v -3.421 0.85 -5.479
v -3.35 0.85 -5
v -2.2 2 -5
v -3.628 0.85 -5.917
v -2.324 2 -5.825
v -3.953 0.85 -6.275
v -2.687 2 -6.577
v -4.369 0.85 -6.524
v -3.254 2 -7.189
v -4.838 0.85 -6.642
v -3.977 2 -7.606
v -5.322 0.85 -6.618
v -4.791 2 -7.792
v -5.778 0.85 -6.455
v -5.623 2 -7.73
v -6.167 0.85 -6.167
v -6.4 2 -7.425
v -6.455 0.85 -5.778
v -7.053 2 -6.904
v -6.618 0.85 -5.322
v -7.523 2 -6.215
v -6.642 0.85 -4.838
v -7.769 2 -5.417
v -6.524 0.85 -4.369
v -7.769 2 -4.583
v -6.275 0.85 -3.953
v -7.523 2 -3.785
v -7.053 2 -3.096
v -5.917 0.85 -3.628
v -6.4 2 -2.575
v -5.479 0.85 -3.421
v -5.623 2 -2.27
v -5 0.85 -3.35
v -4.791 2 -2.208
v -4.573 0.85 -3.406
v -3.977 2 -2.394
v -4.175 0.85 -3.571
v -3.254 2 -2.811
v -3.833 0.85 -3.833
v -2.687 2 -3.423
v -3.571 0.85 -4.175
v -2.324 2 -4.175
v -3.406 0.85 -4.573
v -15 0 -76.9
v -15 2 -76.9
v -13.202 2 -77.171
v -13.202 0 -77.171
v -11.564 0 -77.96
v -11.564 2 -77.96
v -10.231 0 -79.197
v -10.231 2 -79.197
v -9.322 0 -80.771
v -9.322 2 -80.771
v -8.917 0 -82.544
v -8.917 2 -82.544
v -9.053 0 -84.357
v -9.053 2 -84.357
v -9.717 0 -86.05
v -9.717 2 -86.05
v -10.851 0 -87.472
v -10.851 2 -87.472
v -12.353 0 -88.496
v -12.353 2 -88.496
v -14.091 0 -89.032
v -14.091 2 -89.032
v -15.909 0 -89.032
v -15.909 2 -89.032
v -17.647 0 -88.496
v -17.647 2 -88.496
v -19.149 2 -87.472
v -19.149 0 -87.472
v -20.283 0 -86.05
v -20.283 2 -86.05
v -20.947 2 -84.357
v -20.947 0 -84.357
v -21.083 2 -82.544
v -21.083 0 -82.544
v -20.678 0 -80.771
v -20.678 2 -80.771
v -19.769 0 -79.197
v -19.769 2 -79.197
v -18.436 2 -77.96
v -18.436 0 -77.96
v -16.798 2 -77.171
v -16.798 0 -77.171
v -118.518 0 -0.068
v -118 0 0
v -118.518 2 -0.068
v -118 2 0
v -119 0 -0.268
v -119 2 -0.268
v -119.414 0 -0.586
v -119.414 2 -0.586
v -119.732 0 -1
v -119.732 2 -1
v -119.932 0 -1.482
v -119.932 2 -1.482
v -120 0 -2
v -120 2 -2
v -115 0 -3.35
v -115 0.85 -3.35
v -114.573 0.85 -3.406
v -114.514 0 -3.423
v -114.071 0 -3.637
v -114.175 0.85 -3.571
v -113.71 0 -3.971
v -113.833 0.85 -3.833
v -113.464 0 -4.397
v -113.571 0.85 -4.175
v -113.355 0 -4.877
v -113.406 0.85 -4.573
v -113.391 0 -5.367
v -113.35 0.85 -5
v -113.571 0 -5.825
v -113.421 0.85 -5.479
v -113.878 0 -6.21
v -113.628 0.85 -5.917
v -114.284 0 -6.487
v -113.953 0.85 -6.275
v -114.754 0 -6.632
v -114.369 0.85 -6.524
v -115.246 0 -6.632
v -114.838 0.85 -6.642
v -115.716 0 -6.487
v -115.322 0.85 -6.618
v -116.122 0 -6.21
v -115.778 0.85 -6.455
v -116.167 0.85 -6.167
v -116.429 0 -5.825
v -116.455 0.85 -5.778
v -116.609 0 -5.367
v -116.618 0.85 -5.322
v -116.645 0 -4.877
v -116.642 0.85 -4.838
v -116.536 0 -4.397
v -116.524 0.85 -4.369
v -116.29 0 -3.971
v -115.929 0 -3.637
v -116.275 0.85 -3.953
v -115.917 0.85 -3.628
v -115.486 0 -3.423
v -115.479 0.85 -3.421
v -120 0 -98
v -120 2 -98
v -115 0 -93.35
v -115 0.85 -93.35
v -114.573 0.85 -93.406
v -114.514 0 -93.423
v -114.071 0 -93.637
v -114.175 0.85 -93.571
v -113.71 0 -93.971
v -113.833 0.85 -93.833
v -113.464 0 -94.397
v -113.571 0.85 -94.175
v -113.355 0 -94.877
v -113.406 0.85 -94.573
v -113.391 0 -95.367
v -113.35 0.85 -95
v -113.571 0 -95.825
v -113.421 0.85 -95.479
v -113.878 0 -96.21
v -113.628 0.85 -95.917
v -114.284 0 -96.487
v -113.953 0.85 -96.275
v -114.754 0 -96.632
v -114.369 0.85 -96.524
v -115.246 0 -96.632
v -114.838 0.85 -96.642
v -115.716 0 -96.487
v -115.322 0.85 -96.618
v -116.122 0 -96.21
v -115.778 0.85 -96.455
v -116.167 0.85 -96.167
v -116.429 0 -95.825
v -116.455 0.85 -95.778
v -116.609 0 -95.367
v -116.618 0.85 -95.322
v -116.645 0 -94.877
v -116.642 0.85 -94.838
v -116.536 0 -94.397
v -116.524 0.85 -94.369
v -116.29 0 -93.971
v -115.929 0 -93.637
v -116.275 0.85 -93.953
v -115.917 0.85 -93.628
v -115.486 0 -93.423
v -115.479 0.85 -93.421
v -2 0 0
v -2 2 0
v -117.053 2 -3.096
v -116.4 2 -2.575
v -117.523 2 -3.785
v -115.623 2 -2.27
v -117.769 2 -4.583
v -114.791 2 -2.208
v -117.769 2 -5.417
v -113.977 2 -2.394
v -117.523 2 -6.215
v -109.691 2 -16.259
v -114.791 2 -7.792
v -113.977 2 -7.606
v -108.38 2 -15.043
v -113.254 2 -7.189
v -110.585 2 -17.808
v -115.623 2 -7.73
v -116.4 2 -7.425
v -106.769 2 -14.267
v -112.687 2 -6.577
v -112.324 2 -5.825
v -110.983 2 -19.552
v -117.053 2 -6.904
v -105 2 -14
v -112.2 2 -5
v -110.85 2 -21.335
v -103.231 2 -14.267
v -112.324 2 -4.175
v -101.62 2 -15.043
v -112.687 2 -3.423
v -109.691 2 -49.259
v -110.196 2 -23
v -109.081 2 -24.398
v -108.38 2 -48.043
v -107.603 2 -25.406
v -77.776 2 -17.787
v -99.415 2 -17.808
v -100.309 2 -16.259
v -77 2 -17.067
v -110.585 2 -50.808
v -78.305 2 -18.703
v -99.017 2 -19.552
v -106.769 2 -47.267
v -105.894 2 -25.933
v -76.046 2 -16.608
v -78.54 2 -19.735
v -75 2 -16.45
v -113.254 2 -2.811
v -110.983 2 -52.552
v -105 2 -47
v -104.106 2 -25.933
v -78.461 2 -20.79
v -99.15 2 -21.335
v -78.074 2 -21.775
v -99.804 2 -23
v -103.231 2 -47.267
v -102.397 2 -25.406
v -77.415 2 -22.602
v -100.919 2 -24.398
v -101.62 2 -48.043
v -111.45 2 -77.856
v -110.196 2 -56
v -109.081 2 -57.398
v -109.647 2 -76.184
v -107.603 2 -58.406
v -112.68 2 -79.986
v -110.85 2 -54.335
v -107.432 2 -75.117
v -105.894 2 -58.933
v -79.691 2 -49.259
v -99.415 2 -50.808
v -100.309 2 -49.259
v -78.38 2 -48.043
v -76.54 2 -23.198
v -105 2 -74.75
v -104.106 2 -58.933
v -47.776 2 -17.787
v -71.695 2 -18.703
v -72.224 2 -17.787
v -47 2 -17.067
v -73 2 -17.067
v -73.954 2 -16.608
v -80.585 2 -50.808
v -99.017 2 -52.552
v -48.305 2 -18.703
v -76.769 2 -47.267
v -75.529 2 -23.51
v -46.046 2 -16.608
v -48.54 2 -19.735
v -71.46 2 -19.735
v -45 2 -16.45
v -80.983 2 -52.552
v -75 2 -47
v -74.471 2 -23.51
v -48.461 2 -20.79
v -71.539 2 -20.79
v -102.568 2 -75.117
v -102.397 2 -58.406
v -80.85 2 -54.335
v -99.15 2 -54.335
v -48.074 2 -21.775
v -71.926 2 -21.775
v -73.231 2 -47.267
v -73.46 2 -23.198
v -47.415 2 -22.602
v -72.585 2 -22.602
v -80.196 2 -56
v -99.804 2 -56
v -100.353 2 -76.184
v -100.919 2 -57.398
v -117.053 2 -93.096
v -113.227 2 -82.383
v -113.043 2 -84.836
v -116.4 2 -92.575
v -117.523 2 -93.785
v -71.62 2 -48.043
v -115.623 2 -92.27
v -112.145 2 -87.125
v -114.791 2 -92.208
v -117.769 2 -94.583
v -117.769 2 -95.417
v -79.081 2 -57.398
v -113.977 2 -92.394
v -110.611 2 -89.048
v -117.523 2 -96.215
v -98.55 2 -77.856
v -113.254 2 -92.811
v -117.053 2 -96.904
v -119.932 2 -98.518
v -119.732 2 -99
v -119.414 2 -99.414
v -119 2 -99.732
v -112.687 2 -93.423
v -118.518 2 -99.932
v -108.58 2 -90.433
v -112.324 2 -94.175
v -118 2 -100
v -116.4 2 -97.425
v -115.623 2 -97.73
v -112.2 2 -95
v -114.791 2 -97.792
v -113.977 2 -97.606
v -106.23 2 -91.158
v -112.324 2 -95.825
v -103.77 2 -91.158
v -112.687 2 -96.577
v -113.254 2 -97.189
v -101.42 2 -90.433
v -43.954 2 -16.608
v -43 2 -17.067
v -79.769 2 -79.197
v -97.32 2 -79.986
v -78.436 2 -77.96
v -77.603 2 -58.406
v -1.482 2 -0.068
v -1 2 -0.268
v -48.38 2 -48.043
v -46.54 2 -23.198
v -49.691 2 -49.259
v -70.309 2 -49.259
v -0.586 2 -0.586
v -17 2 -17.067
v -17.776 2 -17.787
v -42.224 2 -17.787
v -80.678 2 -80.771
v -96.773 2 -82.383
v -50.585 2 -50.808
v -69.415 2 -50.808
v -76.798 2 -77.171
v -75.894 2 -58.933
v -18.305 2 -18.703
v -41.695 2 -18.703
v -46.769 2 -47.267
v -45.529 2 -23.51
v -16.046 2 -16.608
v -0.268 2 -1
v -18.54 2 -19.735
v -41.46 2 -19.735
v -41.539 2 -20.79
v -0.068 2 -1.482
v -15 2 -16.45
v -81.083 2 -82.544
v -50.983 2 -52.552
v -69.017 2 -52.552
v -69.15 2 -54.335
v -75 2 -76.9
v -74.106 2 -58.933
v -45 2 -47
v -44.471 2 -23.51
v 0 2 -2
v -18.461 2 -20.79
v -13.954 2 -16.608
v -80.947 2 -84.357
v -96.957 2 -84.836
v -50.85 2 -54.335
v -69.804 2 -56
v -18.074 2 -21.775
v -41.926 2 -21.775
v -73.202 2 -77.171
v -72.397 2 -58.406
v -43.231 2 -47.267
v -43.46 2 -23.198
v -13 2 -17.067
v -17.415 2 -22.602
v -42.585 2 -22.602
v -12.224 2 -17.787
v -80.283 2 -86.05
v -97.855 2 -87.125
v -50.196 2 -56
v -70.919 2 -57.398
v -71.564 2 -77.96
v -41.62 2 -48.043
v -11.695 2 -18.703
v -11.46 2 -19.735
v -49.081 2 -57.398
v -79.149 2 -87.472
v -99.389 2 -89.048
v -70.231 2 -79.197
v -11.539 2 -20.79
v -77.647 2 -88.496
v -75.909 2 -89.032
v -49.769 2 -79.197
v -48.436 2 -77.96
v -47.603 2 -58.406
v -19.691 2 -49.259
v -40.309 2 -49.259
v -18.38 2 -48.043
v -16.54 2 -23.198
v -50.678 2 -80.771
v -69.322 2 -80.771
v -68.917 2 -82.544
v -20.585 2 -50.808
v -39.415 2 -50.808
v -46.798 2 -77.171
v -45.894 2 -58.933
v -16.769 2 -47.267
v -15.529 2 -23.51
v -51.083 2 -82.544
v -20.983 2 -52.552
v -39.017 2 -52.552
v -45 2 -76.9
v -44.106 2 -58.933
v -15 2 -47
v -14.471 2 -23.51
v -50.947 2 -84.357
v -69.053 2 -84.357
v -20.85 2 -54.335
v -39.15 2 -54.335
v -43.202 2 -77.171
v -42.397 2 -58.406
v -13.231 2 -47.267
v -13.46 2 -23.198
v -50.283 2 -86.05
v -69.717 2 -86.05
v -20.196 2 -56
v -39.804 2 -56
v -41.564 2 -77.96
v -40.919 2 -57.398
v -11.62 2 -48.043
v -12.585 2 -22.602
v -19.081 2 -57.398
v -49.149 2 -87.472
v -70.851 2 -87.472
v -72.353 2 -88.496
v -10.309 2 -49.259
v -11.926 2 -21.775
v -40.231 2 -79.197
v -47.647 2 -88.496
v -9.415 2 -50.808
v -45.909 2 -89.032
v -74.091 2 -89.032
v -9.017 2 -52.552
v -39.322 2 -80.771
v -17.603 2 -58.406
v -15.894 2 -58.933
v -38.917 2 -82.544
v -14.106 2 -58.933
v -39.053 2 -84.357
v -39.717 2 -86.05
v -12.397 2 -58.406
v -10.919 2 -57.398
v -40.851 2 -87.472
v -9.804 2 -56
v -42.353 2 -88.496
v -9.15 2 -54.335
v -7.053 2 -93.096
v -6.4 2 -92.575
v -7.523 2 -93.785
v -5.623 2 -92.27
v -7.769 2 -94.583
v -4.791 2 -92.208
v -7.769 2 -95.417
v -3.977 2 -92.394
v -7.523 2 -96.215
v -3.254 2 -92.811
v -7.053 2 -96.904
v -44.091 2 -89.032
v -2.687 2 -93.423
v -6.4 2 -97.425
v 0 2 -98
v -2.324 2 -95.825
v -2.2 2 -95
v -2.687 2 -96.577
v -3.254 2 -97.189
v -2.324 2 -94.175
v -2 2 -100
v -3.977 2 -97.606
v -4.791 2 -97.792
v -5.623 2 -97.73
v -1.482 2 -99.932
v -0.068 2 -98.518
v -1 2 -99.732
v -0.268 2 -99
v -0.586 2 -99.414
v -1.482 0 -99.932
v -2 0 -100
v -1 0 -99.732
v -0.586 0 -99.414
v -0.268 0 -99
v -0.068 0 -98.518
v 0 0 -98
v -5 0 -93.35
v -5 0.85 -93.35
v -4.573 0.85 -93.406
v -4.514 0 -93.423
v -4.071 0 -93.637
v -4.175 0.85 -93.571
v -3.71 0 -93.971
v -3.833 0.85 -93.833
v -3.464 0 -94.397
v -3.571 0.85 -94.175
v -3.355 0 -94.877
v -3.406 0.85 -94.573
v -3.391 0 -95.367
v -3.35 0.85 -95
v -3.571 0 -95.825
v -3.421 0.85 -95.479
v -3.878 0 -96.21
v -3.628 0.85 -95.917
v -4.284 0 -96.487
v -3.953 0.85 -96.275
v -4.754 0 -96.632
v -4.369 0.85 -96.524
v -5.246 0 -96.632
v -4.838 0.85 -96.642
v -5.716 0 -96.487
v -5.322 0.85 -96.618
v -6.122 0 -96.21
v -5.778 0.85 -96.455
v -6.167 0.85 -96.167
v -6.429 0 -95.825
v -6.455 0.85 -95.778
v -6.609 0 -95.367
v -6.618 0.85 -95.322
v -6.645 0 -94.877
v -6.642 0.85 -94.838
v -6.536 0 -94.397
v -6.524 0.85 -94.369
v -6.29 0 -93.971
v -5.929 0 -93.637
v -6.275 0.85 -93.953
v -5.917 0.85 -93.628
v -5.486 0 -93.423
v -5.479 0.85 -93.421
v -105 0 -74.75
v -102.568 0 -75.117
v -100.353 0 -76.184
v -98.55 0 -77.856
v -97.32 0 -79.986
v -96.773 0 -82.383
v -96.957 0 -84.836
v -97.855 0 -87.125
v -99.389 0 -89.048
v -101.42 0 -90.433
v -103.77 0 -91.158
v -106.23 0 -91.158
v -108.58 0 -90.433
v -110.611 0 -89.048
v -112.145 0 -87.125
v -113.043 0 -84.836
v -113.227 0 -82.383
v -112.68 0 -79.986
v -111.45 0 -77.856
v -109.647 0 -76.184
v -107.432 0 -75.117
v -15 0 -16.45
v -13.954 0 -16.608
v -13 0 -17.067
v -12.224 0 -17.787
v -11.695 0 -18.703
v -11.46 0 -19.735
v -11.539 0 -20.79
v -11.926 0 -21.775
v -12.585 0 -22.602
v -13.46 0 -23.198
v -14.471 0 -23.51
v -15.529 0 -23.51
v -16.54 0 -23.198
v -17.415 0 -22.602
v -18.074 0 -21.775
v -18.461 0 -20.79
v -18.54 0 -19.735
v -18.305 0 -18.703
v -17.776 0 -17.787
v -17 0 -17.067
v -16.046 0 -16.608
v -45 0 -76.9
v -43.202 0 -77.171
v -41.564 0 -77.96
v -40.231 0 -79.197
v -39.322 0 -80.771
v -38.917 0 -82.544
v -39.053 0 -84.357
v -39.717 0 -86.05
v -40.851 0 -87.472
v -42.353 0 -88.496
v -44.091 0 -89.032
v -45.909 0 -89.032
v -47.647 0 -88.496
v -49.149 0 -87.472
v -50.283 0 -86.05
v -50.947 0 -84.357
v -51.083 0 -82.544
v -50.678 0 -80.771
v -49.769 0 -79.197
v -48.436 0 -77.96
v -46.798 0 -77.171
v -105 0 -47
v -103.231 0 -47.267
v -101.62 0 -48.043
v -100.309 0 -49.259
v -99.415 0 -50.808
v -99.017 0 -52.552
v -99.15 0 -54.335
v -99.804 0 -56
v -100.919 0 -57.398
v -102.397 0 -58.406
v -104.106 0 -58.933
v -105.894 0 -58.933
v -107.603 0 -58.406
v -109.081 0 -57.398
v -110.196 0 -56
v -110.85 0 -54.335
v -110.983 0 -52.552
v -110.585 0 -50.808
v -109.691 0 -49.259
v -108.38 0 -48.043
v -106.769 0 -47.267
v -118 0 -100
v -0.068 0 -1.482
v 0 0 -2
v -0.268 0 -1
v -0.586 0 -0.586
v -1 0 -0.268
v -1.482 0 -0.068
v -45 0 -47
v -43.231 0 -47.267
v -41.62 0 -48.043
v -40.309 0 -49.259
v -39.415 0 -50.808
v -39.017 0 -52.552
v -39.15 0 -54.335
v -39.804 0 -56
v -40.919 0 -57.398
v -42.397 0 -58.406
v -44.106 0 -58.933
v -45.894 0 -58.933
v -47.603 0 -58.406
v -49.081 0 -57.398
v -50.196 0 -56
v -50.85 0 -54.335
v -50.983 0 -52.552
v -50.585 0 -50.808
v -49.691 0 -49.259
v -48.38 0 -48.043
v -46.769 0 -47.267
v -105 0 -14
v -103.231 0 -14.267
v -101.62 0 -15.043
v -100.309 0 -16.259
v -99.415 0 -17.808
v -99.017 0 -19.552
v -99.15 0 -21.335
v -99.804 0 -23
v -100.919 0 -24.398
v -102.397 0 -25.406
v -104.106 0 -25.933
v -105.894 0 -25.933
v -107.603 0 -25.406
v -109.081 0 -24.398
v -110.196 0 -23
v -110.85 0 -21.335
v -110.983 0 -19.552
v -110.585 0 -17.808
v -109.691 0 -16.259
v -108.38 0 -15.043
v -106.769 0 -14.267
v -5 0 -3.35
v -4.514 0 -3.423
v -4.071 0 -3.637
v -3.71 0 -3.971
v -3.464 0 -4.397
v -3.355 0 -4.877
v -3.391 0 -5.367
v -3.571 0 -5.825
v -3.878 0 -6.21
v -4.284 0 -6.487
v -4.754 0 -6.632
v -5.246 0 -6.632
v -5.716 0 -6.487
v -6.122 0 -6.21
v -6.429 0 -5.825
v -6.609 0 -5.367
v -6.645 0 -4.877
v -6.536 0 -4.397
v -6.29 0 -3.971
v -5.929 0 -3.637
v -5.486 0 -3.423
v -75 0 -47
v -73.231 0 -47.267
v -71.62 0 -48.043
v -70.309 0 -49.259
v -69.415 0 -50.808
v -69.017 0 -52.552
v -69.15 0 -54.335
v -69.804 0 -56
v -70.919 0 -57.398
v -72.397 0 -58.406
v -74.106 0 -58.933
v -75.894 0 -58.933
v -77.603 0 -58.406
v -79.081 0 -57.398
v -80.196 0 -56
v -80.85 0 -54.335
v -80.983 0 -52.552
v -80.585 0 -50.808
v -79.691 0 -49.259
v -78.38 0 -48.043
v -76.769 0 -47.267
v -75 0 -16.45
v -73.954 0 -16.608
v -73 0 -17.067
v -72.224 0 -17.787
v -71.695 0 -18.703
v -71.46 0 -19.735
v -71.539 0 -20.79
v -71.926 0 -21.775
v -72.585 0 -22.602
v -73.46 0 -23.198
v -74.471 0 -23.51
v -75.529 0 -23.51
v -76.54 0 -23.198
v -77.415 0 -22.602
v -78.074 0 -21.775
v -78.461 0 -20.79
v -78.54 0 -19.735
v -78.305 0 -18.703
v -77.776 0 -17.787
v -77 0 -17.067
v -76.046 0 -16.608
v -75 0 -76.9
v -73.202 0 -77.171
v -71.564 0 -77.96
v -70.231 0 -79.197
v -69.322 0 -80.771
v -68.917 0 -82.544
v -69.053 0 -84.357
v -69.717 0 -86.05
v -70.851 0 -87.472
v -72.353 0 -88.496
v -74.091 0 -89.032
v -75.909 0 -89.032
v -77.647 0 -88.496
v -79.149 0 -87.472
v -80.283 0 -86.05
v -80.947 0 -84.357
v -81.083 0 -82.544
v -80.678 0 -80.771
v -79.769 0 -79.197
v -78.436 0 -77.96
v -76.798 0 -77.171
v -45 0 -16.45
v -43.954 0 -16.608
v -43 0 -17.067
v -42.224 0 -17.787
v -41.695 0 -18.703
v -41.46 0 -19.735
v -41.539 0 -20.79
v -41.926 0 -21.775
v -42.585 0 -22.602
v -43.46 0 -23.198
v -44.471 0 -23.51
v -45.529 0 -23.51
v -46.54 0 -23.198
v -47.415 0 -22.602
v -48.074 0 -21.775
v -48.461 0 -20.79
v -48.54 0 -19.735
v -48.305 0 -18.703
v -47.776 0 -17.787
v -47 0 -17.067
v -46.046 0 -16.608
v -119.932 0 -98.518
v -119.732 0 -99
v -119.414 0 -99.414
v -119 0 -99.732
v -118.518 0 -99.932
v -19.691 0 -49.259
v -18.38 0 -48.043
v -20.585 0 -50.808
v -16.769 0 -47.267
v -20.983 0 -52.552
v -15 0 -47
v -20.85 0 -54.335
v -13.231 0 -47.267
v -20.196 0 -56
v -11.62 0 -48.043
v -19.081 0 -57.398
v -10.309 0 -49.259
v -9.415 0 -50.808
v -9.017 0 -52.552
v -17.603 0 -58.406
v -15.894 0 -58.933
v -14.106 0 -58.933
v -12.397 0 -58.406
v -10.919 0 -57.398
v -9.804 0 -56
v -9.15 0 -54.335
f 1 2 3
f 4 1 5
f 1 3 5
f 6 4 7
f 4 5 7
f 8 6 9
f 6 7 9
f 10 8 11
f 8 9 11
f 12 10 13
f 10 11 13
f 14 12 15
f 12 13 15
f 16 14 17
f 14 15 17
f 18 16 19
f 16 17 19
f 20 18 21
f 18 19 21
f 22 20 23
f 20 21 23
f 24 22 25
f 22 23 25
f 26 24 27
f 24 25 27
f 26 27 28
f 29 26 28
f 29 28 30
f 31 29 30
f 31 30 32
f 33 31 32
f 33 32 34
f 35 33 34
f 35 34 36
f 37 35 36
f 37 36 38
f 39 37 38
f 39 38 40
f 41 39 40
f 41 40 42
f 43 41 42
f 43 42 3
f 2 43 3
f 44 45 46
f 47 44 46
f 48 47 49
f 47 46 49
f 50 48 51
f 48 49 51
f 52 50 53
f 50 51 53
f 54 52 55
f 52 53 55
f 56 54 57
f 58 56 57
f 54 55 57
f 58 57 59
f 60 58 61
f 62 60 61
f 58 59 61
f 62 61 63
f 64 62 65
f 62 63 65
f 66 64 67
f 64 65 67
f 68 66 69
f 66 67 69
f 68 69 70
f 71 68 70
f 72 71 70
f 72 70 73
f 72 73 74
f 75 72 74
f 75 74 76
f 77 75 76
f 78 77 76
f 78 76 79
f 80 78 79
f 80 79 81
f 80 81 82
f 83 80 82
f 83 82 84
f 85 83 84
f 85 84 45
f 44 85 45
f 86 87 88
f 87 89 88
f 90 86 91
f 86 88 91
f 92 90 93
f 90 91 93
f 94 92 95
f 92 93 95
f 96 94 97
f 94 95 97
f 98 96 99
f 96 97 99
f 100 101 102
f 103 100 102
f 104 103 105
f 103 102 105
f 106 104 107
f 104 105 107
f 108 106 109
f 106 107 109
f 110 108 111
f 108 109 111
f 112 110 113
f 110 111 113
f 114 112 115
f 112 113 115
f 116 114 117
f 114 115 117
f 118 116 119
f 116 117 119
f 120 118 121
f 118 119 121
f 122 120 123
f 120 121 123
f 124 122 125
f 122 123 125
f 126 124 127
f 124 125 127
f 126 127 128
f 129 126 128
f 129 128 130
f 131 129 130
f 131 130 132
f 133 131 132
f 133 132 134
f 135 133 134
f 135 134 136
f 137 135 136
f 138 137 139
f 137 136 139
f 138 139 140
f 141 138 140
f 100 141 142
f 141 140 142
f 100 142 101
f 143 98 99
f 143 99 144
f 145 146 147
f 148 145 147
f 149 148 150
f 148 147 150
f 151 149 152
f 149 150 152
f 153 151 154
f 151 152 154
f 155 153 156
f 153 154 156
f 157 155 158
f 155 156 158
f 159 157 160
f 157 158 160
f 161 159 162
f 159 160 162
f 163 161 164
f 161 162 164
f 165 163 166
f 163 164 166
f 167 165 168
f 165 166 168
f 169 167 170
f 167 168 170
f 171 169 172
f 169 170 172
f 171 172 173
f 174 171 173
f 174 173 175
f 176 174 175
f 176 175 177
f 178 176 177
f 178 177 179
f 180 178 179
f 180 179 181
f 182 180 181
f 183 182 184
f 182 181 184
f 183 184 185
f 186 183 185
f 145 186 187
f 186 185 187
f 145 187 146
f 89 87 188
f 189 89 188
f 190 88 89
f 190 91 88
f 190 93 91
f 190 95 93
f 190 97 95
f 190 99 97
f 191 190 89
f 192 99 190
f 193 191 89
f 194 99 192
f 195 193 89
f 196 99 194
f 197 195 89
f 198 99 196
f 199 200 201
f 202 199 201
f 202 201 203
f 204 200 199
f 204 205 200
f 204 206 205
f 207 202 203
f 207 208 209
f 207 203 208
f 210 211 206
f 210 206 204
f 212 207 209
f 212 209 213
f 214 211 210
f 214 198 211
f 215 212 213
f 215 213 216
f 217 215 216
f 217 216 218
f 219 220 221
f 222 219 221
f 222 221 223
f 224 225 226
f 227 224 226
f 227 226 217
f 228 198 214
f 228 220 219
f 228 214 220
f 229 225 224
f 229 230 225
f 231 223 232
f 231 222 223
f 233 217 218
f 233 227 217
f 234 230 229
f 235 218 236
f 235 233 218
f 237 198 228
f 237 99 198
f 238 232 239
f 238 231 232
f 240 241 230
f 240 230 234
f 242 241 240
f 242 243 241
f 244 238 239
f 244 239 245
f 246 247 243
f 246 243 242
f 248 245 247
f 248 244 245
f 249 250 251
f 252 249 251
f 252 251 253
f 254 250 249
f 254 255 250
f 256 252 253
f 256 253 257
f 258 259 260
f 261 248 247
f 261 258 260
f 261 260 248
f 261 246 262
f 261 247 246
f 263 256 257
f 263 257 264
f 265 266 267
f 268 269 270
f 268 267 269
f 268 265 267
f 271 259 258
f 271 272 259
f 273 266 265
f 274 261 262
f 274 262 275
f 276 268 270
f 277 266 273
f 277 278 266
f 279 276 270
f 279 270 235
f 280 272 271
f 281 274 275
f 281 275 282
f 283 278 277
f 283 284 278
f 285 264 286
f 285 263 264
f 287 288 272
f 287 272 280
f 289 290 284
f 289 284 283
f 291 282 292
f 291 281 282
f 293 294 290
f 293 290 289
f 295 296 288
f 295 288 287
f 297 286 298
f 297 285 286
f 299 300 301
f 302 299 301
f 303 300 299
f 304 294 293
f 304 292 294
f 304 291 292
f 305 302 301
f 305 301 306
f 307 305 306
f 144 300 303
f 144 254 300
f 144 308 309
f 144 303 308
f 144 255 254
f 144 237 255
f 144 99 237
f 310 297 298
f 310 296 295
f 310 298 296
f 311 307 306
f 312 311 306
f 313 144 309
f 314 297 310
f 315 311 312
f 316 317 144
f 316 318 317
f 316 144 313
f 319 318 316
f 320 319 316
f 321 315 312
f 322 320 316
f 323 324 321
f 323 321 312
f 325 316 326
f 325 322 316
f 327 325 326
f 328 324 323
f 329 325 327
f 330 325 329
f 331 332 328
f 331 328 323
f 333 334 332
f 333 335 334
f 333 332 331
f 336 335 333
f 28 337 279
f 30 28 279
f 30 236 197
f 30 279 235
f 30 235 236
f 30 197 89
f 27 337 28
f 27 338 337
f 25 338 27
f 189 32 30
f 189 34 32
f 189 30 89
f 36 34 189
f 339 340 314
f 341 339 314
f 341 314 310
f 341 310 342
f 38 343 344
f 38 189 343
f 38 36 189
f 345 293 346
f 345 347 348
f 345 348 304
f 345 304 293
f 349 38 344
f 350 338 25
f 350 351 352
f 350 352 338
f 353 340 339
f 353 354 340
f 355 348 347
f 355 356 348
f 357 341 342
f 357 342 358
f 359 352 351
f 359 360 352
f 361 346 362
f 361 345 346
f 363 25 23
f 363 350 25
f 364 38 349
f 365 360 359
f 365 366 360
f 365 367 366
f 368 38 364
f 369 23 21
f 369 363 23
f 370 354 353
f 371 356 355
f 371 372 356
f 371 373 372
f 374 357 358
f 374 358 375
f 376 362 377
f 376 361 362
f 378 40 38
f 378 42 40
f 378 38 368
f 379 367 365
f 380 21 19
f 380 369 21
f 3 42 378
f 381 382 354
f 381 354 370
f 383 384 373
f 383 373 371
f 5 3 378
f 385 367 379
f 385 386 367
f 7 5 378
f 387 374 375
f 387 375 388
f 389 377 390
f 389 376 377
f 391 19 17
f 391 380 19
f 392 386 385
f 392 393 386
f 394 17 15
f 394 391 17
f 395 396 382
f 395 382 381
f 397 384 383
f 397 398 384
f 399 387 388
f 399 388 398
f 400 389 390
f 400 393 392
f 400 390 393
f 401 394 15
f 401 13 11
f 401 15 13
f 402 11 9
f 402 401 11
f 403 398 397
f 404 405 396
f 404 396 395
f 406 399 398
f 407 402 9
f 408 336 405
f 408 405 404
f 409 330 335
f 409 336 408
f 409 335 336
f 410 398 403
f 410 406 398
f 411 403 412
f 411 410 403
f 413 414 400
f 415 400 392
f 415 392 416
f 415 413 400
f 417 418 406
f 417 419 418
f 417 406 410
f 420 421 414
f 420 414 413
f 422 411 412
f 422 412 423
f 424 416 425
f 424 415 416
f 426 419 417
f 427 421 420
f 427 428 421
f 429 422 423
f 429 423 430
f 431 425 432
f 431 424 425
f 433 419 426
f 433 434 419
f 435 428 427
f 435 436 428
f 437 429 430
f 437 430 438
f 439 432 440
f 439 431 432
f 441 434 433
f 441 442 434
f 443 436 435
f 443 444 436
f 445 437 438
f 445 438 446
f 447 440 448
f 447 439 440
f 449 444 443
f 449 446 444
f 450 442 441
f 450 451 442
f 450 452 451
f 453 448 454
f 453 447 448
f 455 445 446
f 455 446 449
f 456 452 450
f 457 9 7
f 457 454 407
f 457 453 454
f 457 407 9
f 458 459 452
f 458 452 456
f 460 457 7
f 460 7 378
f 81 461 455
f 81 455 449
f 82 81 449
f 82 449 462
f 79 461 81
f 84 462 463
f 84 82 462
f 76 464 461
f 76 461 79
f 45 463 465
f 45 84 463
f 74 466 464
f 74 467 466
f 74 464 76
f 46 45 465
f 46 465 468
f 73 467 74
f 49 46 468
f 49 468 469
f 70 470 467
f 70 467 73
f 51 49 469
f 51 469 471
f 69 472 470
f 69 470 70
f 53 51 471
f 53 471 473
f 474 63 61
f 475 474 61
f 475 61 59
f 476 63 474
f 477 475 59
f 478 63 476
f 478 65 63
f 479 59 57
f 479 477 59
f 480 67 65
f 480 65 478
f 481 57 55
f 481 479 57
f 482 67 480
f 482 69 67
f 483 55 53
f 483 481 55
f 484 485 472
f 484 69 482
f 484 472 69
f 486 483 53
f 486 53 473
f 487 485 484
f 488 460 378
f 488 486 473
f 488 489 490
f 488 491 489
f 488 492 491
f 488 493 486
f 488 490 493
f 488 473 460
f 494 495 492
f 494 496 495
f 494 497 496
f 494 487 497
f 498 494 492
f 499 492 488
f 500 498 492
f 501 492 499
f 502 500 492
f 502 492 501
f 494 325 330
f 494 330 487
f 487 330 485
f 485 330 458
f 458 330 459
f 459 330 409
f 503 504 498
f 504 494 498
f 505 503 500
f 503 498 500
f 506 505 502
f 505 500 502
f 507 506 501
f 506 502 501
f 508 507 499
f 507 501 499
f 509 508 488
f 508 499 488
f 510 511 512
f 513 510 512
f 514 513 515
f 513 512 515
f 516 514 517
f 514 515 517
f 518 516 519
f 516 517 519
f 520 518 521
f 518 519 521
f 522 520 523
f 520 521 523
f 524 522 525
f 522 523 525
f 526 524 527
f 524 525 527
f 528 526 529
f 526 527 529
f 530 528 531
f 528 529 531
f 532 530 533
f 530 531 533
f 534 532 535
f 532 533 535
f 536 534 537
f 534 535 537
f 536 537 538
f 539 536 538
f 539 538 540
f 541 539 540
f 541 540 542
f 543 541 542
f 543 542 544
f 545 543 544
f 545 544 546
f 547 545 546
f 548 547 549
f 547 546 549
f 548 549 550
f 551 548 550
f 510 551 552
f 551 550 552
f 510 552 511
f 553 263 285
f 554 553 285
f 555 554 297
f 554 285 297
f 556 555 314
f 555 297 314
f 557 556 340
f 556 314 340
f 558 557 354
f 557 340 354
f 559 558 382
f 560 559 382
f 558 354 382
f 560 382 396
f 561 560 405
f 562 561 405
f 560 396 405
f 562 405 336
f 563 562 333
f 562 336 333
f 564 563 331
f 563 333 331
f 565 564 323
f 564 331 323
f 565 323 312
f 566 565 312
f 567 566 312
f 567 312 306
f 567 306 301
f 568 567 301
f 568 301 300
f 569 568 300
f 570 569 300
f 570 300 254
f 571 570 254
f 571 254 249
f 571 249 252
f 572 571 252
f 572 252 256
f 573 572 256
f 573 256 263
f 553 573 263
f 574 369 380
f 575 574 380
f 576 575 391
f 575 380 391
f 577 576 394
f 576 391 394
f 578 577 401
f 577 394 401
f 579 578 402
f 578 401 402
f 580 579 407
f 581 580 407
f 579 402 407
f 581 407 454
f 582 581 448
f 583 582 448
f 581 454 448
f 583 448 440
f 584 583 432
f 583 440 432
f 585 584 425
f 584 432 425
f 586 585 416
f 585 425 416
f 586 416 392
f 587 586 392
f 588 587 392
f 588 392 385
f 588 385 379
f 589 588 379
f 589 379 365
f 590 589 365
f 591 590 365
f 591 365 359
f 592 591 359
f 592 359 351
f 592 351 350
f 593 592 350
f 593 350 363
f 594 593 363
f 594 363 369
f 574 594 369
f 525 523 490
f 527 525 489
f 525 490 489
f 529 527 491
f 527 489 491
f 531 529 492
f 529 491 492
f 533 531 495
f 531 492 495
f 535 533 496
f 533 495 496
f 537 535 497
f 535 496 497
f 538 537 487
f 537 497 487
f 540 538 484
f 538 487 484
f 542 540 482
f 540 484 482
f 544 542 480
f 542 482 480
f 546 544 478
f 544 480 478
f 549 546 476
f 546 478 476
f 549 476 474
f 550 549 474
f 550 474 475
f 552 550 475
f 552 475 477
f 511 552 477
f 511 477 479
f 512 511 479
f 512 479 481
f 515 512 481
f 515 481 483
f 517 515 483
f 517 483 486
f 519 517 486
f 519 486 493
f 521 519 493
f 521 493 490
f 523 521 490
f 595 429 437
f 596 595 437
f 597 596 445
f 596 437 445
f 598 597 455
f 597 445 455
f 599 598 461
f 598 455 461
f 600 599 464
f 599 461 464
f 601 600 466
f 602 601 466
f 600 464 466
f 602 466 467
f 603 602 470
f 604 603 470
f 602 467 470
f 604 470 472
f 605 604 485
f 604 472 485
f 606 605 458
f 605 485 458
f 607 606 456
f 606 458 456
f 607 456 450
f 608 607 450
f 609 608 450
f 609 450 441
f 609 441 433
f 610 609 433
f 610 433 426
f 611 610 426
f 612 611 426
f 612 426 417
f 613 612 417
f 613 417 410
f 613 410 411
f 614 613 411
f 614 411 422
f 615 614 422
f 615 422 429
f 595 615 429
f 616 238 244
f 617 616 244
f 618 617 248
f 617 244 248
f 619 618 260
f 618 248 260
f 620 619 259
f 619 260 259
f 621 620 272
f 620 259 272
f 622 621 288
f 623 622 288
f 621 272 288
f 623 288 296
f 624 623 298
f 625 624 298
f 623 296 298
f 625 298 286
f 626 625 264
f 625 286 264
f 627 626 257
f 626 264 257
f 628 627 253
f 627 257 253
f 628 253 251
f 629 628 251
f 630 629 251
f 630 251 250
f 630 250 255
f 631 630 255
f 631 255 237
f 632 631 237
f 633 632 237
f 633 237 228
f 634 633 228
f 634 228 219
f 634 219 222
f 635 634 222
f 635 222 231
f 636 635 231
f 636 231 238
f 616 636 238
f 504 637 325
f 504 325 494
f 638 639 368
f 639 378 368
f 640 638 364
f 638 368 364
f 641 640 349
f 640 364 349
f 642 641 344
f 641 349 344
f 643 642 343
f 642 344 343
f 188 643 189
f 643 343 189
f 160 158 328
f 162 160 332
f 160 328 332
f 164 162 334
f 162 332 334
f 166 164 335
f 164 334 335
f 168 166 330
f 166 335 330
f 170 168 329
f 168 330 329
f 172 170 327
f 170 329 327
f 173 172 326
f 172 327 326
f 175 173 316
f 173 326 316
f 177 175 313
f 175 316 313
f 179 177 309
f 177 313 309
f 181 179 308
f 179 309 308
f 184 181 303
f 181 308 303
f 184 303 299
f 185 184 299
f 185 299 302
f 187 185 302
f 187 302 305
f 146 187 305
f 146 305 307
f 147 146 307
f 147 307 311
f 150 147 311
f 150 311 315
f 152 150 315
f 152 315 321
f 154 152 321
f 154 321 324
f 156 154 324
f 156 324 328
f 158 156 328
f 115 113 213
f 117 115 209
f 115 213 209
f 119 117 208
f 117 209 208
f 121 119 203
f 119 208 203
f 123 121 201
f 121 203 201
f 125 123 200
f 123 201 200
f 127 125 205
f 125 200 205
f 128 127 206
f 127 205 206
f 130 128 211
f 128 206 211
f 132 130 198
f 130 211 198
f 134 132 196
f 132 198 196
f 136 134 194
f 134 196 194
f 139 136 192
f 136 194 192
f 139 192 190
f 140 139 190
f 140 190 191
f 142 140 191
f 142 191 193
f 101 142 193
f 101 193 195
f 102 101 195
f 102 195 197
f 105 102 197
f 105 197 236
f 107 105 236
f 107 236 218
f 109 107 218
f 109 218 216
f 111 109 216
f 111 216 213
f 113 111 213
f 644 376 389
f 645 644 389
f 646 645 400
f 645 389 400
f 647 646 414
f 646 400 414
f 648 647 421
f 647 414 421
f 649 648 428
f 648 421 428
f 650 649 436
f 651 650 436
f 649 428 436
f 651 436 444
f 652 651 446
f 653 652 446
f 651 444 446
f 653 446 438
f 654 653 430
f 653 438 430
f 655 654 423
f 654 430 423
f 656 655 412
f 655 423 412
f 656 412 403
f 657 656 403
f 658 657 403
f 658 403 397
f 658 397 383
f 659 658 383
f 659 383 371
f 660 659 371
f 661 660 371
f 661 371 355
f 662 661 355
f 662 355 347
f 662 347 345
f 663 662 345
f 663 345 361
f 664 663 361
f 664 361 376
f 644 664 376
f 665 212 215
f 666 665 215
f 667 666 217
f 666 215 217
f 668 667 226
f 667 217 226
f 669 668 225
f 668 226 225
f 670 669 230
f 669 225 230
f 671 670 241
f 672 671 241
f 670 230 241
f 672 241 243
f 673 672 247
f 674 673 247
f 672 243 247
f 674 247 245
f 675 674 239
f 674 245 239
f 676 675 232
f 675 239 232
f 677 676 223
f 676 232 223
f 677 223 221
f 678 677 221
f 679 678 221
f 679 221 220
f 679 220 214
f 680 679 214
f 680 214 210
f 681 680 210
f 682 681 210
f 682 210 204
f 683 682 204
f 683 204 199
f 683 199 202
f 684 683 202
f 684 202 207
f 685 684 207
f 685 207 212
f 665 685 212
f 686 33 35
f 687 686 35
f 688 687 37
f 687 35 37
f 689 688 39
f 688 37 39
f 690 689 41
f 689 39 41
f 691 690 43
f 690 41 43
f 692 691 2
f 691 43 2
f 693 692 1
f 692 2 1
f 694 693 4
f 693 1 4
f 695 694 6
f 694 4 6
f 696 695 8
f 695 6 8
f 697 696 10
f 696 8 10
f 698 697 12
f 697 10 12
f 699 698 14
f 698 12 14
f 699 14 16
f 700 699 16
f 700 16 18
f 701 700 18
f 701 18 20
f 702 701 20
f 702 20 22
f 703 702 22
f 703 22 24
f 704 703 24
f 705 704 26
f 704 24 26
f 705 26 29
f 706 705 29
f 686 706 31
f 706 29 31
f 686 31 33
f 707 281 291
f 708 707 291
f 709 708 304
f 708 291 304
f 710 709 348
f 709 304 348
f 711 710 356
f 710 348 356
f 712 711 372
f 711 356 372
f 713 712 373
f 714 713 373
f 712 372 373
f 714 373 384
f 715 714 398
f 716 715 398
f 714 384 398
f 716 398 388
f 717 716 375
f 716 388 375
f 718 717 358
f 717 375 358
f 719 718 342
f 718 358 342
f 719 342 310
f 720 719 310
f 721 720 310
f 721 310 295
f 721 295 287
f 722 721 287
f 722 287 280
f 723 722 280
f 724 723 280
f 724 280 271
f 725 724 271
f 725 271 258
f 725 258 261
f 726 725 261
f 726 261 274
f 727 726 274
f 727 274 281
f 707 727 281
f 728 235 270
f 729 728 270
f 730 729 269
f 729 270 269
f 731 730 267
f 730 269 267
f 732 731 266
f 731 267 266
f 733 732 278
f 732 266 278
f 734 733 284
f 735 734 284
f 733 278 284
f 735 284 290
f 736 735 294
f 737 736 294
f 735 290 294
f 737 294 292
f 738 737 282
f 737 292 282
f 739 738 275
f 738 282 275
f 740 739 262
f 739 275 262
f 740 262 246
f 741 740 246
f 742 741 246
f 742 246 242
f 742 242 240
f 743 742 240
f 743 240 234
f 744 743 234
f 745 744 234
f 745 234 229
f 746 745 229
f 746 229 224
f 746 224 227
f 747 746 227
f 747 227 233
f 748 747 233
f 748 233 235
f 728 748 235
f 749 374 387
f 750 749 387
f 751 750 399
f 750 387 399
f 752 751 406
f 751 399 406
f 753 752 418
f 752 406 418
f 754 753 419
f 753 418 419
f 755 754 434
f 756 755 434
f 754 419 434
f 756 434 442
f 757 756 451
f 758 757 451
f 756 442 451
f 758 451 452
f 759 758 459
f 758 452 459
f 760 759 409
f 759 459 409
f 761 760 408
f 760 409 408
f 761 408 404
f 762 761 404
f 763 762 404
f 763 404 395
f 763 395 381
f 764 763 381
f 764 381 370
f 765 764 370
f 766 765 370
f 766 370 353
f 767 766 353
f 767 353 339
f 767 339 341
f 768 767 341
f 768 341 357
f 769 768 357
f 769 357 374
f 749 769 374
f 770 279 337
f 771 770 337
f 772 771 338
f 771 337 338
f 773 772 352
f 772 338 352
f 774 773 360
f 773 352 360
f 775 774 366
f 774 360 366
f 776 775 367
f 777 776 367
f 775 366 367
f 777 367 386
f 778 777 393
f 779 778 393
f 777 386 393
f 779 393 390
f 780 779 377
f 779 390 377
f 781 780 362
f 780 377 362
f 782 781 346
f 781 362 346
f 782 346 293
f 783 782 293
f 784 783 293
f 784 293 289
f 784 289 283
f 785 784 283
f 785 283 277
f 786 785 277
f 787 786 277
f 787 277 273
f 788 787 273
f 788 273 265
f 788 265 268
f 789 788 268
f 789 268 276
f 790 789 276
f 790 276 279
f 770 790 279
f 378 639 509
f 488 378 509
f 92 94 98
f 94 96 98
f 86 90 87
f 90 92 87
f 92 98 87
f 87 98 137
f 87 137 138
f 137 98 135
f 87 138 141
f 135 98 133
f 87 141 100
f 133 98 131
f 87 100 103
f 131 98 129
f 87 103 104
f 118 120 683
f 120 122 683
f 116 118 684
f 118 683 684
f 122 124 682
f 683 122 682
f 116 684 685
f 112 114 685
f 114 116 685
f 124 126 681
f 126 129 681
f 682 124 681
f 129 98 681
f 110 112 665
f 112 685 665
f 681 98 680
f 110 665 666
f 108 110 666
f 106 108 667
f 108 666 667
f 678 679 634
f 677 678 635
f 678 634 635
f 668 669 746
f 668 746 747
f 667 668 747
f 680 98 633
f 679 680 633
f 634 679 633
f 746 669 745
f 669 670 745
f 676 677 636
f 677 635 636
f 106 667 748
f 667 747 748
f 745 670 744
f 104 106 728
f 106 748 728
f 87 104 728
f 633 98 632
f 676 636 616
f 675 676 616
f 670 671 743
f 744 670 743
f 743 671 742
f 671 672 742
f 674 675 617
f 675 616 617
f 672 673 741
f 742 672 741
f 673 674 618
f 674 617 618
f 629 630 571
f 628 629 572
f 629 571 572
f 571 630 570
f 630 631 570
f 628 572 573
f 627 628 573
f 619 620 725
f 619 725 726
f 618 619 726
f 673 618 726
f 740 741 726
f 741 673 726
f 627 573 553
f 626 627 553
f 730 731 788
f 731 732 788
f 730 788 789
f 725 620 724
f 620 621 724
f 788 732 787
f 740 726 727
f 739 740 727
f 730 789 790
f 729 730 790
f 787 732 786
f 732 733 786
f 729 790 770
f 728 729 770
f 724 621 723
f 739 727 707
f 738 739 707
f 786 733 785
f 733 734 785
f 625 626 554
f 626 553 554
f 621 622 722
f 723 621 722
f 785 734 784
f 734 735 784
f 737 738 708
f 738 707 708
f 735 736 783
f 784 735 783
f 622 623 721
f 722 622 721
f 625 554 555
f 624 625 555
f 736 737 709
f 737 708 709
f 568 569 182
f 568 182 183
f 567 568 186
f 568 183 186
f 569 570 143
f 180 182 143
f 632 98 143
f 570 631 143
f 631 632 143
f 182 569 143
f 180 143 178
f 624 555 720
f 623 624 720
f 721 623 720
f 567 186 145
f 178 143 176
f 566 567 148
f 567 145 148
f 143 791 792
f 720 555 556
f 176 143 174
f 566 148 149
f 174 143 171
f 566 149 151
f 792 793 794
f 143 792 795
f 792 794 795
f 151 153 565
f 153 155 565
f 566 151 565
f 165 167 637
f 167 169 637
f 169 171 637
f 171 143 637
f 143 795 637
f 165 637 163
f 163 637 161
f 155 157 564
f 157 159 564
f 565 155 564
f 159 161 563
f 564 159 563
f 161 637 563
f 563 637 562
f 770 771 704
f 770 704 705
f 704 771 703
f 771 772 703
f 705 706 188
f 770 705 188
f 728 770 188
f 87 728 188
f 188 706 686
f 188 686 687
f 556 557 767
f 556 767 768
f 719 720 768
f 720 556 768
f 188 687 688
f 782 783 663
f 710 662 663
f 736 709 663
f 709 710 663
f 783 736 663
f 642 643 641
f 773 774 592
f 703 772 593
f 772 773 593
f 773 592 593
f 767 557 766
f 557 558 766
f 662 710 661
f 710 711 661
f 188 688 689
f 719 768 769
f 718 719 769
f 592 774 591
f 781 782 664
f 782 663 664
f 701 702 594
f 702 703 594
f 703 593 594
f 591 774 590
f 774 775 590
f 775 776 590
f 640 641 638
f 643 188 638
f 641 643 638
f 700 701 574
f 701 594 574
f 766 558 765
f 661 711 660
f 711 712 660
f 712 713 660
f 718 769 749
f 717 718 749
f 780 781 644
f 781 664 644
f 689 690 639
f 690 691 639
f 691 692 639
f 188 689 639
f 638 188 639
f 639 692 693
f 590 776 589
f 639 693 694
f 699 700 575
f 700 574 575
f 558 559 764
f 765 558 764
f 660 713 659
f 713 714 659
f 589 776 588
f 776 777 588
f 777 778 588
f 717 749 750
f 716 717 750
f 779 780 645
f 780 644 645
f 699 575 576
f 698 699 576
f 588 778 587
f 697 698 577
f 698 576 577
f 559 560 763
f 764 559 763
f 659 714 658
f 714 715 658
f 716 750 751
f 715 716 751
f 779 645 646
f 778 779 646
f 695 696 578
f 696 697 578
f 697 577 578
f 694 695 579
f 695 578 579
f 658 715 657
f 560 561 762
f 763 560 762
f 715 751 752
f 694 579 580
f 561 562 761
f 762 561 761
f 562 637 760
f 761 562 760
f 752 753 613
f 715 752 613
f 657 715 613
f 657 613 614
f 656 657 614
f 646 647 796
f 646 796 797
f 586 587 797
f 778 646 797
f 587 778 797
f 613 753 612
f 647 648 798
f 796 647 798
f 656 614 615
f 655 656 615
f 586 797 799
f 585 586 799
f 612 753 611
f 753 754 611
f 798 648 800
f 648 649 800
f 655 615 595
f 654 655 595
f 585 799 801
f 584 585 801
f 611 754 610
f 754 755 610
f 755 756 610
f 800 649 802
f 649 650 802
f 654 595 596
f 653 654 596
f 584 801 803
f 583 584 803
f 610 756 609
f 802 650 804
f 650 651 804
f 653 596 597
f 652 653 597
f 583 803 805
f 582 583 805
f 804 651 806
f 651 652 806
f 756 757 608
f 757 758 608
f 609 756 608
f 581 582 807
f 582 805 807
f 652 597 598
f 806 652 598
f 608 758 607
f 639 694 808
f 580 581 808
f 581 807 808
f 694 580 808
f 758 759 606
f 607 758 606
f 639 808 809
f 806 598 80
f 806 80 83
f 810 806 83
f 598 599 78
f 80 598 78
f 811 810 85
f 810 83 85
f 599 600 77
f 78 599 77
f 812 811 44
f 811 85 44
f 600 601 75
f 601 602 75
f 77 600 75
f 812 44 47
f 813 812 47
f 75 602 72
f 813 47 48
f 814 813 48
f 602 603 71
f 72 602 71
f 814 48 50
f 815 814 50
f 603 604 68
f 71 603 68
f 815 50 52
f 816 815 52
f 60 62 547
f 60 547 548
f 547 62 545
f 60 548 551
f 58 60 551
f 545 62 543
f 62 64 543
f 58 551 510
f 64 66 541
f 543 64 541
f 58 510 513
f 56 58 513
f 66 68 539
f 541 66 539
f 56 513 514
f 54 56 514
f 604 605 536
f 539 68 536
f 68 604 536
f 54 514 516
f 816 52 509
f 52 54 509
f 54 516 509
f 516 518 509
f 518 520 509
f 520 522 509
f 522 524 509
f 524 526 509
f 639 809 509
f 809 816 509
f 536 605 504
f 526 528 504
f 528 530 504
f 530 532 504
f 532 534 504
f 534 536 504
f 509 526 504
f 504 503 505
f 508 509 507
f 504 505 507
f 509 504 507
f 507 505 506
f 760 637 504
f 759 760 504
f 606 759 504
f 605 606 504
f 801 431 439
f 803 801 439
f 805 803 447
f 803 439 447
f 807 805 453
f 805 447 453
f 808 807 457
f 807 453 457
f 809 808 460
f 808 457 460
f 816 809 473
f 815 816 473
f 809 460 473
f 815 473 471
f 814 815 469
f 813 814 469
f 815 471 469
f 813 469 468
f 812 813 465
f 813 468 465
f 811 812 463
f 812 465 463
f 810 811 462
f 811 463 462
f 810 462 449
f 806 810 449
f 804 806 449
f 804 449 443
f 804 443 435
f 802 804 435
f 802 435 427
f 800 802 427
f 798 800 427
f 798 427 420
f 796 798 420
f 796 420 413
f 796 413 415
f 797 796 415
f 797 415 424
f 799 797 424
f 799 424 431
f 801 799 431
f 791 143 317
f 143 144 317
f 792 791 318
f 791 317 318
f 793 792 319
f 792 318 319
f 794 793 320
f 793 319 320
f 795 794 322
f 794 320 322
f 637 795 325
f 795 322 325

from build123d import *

# Parameters (mm, degrees)
BOTTOM_PLATE_W                       = 120
BOTTOM_PLATE_H                       = 100
BOTTOM_PLATE_EXT_DEPTH               = 2
MIDDLE_ROW_R                         = 6
MIDDLE_ROW_CUT_DEPTH                 = 157.217796681
TOP_ROW_R                            = 8.25
TOP_ROW_R_2                          = 6.1
TOP_ROW_CUT_DEPTH                    = 157.217796681
BOTTOM_ROW_R                         = 3.55
BOTTOM_ROW_R_2                       = 6
BOTTOM_ROW_CUT_DEPTH                 = 157.217796681
PLATE_SCREWS_R                       = 1.65
PLATE_SCREWS_CUT_DEPTH               = 157.217796681
PLATE_SCREW_HEAD_R                   = 2.8
PLATE_SCREW_HEAD_CUT_DEPTH           = 2
PLATE_SCREW_HEAD_CUT_DRAFT           = -45
PLATE_SCREW_HEAD_CUT_PROFILE_2_DEPTH = 2
PLATE_SCREW_HEAD_CUT_PROFILE_2_DRAFT = -45
PLATE_SCREW_HEAD_CUT_PROFILE_3_DEPTH = 2
PLATE_SCREW_HEAD_CUT_PROFILE_3_DRAFT = -45
PLATE_SCREW_HEAD_CUT_PROFILE_4_DEPTH = 2
PLATE_SCREW_HEAD_CUT_PROFILE_4_DRAFT = -45
FILLET1_R                            = 2
FILLET2_R                            = 2
FILLET3_R                            = 2
FILLET4_R                            = 2


with BuildPart() as part:
    # Bottom Plate → Bottom Plate EXT (new body)
    with BuildSketch(Plane(origin=(0, 0, 0), x_dir=(1, 0, 0), z_dir=(0, 1, 0))):
        with Locations((-60, 50)):
            Rectangle(BOTTOM_PLATE_W, BOTTOM_PLATE_H)
    extrude(amount=BOTTOM_PLATE_EXT_DEPTH)

    # Middle Row → Middle Row Cut (cut, through all)
    with BuildSketch(Plane(origin=(0, 2, 0), x_dir=(1, 0, 0), z_dir=(0, 1, 0))):
        with Locations(Location((-105, 53, 0), (0, 0, 270))):
            Circle(MIDDLE_ROW_R)
        with Locations(Location((-75, 53, 0), (0, 0, 270))):
            Circle(MIDDLE_ROW_R)
        with Locations(Location((-45, 53, 0), (0, 0, 270))):
            Circle(MIDDLE_ROW_R)
        with Locations(Location((-15, 53, 0), (0, 0, 270))):
            Circle(MIDDLE_ROW_R)
    extrude(amount=-MIDDLE_ROW_CUT_DEPTH, mode=Mode.SUBTRACT)

    # Top Row → Top Row Cut (cut, through all)
    with BuildSketch(Plane(origin=(0, 2, 0), x_dir=(1, 0, 0), z_dir=(0, 1, 0))):
        with Locations(Location((-105, 83, 0), (0, 0, 270))):
            Circle(TOP_ROW_R)
        with Locations(Location((-75, 83, 0), (0, 0, 270))):
            Circle(TOP_ROW_R_2)
        with Locations(Location((-45, 83, 0), (0, 0, 270))):
            Circle(TOP_ROW_R_2)
        with Locations(Location((-15, 83, 0), (0, 0, 270))):
            Circle(TOP_ROW_R_2)
    extrude(amount=-TOP_ROW_CUT_DEPTH, mode=Mode.SUBTRACT)

    # Bottom Row → Bottom Row Cut (cut, through all)
    with BuildSketch(Plane(origin=(0, 2, 0), x_dir=(1, 0, 0), z_dir=(0, 1, 0))):
        with Locations(Location((-75, 20, 0), (0, 0, 270))):
            Circle(BOTTOM_ROW_R)
        with Locations(Location((-45, 20, 0), (0, 0, 270))):
            Circle(BOTTOM_ROW_R)
        with Locations(Location((-15, 20, 0), (0, 0, 270))):
            Circle(BOTTOM_ROW_R)
        with Locations(Location((-105, 20, 0), (0, 0, 270))):
            Circle(BOTTOM_ROW_R_2)
    extrude(amount=-BOTTOM_ROW_CUT_DEPTH, mode=Mode.SUBTRACT)

    # Plate Screws → Plate Screws Cut (cut, through all)
    with BuildSketch(Plane(origin=(0, 2, 0), x_dir=(1, 0, 0), z_dir=(0, 1, 0))):
        with Locations(Location((-115, 95, 0), (0, 0, 270))):
            Circle(PLATE_SCREWS_R)
        with Locations(Location((-5, 95, 0), (0, 0, 270))):
            Circle(PLATE_SCREWS_R)
        with Locations(Location((-5, 5, 0), (0, 0, 270))):
            Circle(PLATE_SCREWS_R)
        with Locations(Location((-115, 5, 0), (0, 0, 270))):
            Circle(PLATE_SCREWS_R)
    extrude(amount=-PLATE_SCREWS_CUT_DEPTH, mode=Mode.SUBTRACT)


with BuildPart() as plate_screw_head_cut_tool:
    # Plate Screw Head → Plate Screw Head Cut (with draft: the straight prism first)
    with BuildSketch(Plane(origin=(0, 2, 0), x_dir=(1, 0, 0), z_dir=(0, 1, 0))):
        with Locations((-115, 95)):
            Circle(PLATE_SCREW_HEAD_R)
    extrude(amount=-PLATE_SCREW_HEAD_CUT_DEPTH)
    # Plate Screw Head Cut: the draft: its side faces are tilted about the plane it starts from
    plate_screw_head_cut_sides = [plate_screw_head_cut_tool.faces().sort_by_distance(p)[0] for p in [
        (-117.8, 1, -95),
    ]]
    draft(plate_screw_head_cut_sides, Plane(origin=(0, 2, 0), x_dir=(1, 0, 0), z_dir=(0, 1, 0)), PLATE_SCREW_HEAD_CUT_DRAFT)


with BuildPart() as part_1:
    add(part.part)

    # Plate Screw Head Cut: cut by plate_screw_head_cut_tool
    add(plate_screw_head_cut_tool.part, mode=Mode.SUBTRACT)


with BuildPart() as plate_screw_head_cut_profile_2_tool:
    # Plate Screw Head → Plate Screw Head Cut profile 2 (with draft: the straight prism first)
    with BuildSketch(Plane(origin=(0, 2, 0), x_dir=(1, 0, 0), z_dir=(0, 1, 0))):
        with Locations((-5, 95)):
            Circle(PLATE_SCREW_HEAD_R)
    extrude(amount=-PLATE_SCREW_HEAD_CUT_PROFILE_2_DEPTH)
    # Plate Screw Head Cut profile 2: the draft: its side faces are tilted about the plane it starts from
    plate_screw_head_cut_profile_2_sides = [plate_screw_head_cut_profile_2_tool.faces().sort_by_distance(p)[0] for p in [
        (-7.8, 1, -95),
    ]]
    draft(plate_screw_head_cut_profile_2_sides, Plane(origin=(0, 2, 0), x_dir=(1, 0, 0), z_dir=(0, 1, 0)), PLATE_SCREW_HEAD_CUT_PROFILE_2_DRAFT)


with BuildPart() as part_2:
    add(part_1.part)

    # Plate Screw Head Cut profile 2: cut by plate_screw_head_cut_profile_2_tool
    add(plate_screw_head_cut_profile_2_tool.part, mode=Mode.SUBTRACT)


with BuildPart() as plate_screw_head_cut_profile_3_tool:
    # Plate Screw Head → Plate Screw Head Cut profile 3 (with draft: the straight prism first)
    with BuildSketch(Plane(origin=(0, 2, 0), x_dir=(1, 0, 0), z_dir=(0, 1, 0))):
        with Locations((-5, 5)):
            Circle(PLATE_SCREW_HEAD_R)
    extrude(amount=-PLATE_SCREW_HEAD_CUT_PROFILE_3_DEPTH)
    # Plate Screw Head Cut profile 3: the draft: its side faces are tilted about the plane it starts from
    plate_screw_head_cut_profile_3_sides = [plate_screw_head_cut_profile_3_tool.faces().sort_by_distance(p)[0] for p in [
        (-7.8, 1, -5),
    ]]
    draft(plate_screw_head_cut_profile_3_sides, Plane(origin=(0, 2, 0), x_dir=(1, 0, 0), z_dir=(0, 1, 0)), PLATE_SCREW_HEAD_CUT_PROFILE_3_DRAFT)


with BuildPart() as part_3:
    add(part_2.part)

    # Plate Screw Head Cut profile 3: cut by plate_screw_head_cut_profile_3_tool
    add(plate_screw_head_cut_profile_3_tool.part, mode=Mode.SUBTRACT)


with BuildPart() as plate_screw_head_cut_profile_4_tool:
    # Plate Screw Head → Plate Screw Head Cut profile 4 (with draft: the straight prism first)
    with BuildSketch(Plane(origin=(0, 2, 0), x_dir=(1, 0, 0), z_dir=(0, 1, 0))):
        with Locations((-115, 5)):
            Circle(PLATE_SCREW_HEAD_R)
    extrude(amount=-PLATE_SCREW_HEAD_CUT_PROFILE_4_DEPTH)
    # Plate Screw Head Cut profile 4: the draft: its side faces are tilted about the plane it starts from
    plate_screw_head_cut_profile_4_sides = [plate_screw_head_cut_profile_4_tool.faces().sort_by_distance(p)[0] for p in [
        (-117.8, 1, -5),
    ]]
    draft(plate_screw_head_cut_profile_4_sides, Plane(origin=(0, 2, 0), x_dir=(1, 0, 0), z_dir=(0, 1, 0)), PLATE_SCREW_HEAD_CUT_PROFILE_4_DRAFT)


with BuildPart() as part_4:
    add(part_3.part)

    # Plate Screw Head Cut profile 4: cut by plate_screw_head_cut_profile_4_tool
    add(plate_screw_head_cut_profile_4_tool.part, mode=Mode.SUBTRACT)

    # Fillet1
    fillet1_edges = [part_4.edges().sort_by_distance(p)[0] for p in [
        (-120, 1, -100),
    ]]
    fillet(fillet1_edges, radius=FILLET1_R)

    # Fillet2
    fillet2_edges = [part_4.edges().sort_by_distance(p)[0] for p in [
        (0, 1, -100),
    ]]
    fillet(fillet2_edges, radius=FILLET2_R)

    # Fillet3
    fillet3_edges = [part_4.edges().sort_by_distance(p)[0] for p in [
        (0, 1, 0),
    ]]
    fillet(fillet3_edges, radius=FILLET3_R)

    # Fillet4
    fillet4_edges = [part_4.edges().sort_by_distance(p)[0] for p in [
        (-120, 1, 0),
    ]]
    fillet(fillet4_edges, radius=FILLET4_R)


solid = part_4.part
